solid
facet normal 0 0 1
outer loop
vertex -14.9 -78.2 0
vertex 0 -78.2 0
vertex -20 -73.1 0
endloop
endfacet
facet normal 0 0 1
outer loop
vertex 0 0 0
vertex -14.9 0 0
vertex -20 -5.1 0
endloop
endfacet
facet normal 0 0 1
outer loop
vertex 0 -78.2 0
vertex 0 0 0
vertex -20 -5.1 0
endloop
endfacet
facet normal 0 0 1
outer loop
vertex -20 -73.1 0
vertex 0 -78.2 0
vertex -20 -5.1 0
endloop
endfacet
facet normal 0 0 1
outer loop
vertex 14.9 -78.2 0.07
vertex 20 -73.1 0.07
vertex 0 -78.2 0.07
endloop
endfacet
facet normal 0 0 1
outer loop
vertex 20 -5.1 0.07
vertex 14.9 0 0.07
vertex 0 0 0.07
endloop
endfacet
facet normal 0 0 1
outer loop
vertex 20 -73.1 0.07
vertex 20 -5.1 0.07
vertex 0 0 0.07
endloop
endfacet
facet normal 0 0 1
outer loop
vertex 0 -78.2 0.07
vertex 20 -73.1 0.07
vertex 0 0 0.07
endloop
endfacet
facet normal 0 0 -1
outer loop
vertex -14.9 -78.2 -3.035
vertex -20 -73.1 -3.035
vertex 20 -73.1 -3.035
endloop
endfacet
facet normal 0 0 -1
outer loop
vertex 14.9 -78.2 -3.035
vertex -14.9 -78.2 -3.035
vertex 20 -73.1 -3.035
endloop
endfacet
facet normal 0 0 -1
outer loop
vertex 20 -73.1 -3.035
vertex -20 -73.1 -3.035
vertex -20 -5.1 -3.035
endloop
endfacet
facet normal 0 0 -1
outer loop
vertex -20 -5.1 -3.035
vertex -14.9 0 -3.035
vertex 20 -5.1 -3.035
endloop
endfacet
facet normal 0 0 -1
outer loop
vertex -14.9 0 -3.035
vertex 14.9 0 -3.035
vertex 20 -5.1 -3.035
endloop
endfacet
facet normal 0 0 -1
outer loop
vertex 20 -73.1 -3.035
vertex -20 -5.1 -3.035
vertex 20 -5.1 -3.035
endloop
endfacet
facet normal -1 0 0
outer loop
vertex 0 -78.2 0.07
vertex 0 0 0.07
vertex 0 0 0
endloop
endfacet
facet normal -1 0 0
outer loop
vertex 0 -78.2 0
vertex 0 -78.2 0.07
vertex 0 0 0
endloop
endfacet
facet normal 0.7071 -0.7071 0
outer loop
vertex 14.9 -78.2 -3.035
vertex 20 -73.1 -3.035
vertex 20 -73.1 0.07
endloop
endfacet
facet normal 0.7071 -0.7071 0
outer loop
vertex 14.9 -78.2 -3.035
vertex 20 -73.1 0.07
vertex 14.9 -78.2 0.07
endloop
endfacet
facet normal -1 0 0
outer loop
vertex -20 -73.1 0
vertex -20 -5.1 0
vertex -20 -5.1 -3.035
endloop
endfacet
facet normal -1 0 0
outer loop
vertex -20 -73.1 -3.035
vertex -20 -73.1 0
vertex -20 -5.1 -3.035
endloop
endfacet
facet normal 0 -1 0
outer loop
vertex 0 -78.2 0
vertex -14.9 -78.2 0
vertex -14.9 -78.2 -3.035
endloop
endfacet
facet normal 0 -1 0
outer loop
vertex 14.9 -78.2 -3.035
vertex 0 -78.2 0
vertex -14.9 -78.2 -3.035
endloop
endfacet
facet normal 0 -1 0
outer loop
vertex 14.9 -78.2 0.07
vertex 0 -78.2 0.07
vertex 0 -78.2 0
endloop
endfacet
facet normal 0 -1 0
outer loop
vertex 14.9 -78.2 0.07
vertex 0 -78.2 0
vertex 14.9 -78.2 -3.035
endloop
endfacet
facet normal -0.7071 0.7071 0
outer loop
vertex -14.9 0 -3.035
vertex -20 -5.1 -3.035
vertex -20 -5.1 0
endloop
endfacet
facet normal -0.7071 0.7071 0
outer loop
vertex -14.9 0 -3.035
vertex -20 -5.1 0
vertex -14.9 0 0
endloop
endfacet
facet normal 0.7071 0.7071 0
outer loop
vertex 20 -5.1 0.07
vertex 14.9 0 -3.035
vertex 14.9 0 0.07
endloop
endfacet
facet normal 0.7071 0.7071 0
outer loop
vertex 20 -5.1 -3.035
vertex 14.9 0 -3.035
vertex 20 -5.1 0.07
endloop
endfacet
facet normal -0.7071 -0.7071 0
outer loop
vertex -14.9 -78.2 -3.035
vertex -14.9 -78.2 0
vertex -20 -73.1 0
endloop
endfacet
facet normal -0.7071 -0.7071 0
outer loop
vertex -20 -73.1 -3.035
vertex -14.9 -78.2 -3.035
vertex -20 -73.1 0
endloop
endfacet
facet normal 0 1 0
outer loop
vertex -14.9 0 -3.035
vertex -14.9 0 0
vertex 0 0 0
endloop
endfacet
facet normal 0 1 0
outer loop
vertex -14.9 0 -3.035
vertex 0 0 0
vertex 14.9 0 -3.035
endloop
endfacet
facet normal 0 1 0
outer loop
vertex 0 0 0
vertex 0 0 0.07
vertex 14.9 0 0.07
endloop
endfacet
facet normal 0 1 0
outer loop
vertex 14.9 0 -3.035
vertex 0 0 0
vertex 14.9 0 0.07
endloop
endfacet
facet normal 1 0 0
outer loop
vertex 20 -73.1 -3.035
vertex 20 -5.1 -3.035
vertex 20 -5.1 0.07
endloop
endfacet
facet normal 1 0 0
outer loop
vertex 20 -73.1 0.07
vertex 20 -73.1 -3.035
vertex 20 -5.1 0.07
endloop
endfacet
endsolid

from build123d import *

# Parameters (mm, degrees)
F1_DEPTH = 78.2
F3_DEPTH = 5


with BuildPart() as f1:
    # F0 (on Front) → F1 (new body)
    with BuildSketch(Plane.XZ):
        Polygon((0, 0), (-20, 0), (-20, -3.035), (20, -3.035), (20, 0.07), (0, 0.07), align=None)
    extrude(amount=F1_DEPTH)

    # F2 (on Top) → F3 (cut, symmetric)
    with BuildSketch(Plane.XY):
        Polygon((20, 0), (14.9, 0), (20, -5.1), align=None)
        Polygon((20, -78.2), (20, -73.1), (14.9, -78.2), align=None)
        Polygon((-20, -5.1), (-14.9, 0), (-20, 0), align=None)
        Polygon((-14.9, -78.2), (-20, -73.1), (-20, -78.2), align=None)
    extrude(amount=F3_DEPTH, both=True, mode=Mode.SUBTRACT)


solid = f1.part
